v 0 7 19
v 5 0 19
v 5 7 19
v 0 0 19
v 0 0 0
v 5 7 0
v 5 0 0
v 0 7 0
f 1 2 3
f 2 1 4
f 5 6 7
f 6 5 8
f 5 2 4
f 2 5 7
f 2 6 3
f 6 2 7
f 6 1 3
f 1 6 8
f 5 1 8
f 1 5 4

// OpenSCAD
// Generated by SolidPython 1.0.1 on 2020-07-29 00:46:54


cube(size = [5, 7, 19]);
/***********************************************
*********      SolidPython code:      **********
************************************************
 
# import packages: SolidPython
from solid import *
from solid.utils import *
from itertools import chain, combinations, permutations


class Resize:

    def __init__(self, scad_file):
        self.scad_file = scad_file
        #self.scad_file = import_scad(scad_file)
        # cone/cylinder param:
        self.r1 = 0
        self.r2 = 0
        self.h = 0
        # rectangular prism param:
        self.w = 0
        self.l = 0
        # ellipse param:
        self.r = 0

    # import OpenScad code (file name corresponds to shape)


    # classify shape + parameters
    def assign(self, param1, param2, param3):
        if self.scad_file == 'cone.scad':
            self.r1 = param1
            self.r2 = param2
            self.h = param3
        elif self.scad_file == 'cylinder.scad':
            self.r1 = param1
            self.r2 = param2
            self.h = param3
        elif self.scad_file == 'rectangularPrism.scad':
            self.h = param1
            self.l = param2
            self.w = param3
        else:
            self.r = param1
            self.h = param2

    # resize parameters
    def iterate(self):
        x = range(3, 20, 2)
        i = 1
        if self.scad_file == 'cone.scad':
            tempList = list(permutations(x, 2))
            for temp in tempList:
                param1 = temp[0]
                param2 = temp[1]
                filepath = 'produced_scad_files/' + 'cone' + str(param1) + '_' + str(param2) + '_' + '.scad'
                scad_render_to_file(cylinder(h=param1, r1=param2, r2=0), filepath)

        elif self.scad_file == 'cylinder.scad':
            tempList = list(permutations(x, 3))
            for temp in tempList:
                param1 = temp[0]
                param2 = temp[1]
                filepath = 'produced_scad_files/' + 'cylinder' + str(param1) + '_' + str(param2) + '_' + '.scad'
                scad_render_to_file(cylinder(h=param1, r1=param2, r2=param2), filepath)

        elif self.scad_file == 'rectangularPrism.scad':
            tempList = list(permutations(x, 3))
            for temp in tempList:
                param1 = temp[0]
                param2 = temp[1]
                param3 = temp[2]
                filepath = 'produced_scad_files/' + 'rectangularPrism' + str(param1) + '_' + str(param2) + '_' + str(
                    param3) + '.scad'
                scad_render_to_file(cube(size=(param1, param2, param3)), filepath)

        elif self.scad_file == 'ellipse.scad':
            tempList = list(permutations(x, 4))
            for temp in tempList:
                param1 = temp[0]
                param2 = temp[1]
                param3 = temp[2]
                param4 = temp[3]
                filepath = 'produced_scad_files/' + 'ellipse' + str(param1) + '_' + str(param2) + '_' + str(param3) + '_' + str(param4) + '.scad'
                scad_render_to_file(scale([param1, param2, param3])(sphere(r=param4)), filepath)

    def render_to_scadfile(self):
        scad_render_to_file(scad, 'example.scad') 
 
************************************************/
